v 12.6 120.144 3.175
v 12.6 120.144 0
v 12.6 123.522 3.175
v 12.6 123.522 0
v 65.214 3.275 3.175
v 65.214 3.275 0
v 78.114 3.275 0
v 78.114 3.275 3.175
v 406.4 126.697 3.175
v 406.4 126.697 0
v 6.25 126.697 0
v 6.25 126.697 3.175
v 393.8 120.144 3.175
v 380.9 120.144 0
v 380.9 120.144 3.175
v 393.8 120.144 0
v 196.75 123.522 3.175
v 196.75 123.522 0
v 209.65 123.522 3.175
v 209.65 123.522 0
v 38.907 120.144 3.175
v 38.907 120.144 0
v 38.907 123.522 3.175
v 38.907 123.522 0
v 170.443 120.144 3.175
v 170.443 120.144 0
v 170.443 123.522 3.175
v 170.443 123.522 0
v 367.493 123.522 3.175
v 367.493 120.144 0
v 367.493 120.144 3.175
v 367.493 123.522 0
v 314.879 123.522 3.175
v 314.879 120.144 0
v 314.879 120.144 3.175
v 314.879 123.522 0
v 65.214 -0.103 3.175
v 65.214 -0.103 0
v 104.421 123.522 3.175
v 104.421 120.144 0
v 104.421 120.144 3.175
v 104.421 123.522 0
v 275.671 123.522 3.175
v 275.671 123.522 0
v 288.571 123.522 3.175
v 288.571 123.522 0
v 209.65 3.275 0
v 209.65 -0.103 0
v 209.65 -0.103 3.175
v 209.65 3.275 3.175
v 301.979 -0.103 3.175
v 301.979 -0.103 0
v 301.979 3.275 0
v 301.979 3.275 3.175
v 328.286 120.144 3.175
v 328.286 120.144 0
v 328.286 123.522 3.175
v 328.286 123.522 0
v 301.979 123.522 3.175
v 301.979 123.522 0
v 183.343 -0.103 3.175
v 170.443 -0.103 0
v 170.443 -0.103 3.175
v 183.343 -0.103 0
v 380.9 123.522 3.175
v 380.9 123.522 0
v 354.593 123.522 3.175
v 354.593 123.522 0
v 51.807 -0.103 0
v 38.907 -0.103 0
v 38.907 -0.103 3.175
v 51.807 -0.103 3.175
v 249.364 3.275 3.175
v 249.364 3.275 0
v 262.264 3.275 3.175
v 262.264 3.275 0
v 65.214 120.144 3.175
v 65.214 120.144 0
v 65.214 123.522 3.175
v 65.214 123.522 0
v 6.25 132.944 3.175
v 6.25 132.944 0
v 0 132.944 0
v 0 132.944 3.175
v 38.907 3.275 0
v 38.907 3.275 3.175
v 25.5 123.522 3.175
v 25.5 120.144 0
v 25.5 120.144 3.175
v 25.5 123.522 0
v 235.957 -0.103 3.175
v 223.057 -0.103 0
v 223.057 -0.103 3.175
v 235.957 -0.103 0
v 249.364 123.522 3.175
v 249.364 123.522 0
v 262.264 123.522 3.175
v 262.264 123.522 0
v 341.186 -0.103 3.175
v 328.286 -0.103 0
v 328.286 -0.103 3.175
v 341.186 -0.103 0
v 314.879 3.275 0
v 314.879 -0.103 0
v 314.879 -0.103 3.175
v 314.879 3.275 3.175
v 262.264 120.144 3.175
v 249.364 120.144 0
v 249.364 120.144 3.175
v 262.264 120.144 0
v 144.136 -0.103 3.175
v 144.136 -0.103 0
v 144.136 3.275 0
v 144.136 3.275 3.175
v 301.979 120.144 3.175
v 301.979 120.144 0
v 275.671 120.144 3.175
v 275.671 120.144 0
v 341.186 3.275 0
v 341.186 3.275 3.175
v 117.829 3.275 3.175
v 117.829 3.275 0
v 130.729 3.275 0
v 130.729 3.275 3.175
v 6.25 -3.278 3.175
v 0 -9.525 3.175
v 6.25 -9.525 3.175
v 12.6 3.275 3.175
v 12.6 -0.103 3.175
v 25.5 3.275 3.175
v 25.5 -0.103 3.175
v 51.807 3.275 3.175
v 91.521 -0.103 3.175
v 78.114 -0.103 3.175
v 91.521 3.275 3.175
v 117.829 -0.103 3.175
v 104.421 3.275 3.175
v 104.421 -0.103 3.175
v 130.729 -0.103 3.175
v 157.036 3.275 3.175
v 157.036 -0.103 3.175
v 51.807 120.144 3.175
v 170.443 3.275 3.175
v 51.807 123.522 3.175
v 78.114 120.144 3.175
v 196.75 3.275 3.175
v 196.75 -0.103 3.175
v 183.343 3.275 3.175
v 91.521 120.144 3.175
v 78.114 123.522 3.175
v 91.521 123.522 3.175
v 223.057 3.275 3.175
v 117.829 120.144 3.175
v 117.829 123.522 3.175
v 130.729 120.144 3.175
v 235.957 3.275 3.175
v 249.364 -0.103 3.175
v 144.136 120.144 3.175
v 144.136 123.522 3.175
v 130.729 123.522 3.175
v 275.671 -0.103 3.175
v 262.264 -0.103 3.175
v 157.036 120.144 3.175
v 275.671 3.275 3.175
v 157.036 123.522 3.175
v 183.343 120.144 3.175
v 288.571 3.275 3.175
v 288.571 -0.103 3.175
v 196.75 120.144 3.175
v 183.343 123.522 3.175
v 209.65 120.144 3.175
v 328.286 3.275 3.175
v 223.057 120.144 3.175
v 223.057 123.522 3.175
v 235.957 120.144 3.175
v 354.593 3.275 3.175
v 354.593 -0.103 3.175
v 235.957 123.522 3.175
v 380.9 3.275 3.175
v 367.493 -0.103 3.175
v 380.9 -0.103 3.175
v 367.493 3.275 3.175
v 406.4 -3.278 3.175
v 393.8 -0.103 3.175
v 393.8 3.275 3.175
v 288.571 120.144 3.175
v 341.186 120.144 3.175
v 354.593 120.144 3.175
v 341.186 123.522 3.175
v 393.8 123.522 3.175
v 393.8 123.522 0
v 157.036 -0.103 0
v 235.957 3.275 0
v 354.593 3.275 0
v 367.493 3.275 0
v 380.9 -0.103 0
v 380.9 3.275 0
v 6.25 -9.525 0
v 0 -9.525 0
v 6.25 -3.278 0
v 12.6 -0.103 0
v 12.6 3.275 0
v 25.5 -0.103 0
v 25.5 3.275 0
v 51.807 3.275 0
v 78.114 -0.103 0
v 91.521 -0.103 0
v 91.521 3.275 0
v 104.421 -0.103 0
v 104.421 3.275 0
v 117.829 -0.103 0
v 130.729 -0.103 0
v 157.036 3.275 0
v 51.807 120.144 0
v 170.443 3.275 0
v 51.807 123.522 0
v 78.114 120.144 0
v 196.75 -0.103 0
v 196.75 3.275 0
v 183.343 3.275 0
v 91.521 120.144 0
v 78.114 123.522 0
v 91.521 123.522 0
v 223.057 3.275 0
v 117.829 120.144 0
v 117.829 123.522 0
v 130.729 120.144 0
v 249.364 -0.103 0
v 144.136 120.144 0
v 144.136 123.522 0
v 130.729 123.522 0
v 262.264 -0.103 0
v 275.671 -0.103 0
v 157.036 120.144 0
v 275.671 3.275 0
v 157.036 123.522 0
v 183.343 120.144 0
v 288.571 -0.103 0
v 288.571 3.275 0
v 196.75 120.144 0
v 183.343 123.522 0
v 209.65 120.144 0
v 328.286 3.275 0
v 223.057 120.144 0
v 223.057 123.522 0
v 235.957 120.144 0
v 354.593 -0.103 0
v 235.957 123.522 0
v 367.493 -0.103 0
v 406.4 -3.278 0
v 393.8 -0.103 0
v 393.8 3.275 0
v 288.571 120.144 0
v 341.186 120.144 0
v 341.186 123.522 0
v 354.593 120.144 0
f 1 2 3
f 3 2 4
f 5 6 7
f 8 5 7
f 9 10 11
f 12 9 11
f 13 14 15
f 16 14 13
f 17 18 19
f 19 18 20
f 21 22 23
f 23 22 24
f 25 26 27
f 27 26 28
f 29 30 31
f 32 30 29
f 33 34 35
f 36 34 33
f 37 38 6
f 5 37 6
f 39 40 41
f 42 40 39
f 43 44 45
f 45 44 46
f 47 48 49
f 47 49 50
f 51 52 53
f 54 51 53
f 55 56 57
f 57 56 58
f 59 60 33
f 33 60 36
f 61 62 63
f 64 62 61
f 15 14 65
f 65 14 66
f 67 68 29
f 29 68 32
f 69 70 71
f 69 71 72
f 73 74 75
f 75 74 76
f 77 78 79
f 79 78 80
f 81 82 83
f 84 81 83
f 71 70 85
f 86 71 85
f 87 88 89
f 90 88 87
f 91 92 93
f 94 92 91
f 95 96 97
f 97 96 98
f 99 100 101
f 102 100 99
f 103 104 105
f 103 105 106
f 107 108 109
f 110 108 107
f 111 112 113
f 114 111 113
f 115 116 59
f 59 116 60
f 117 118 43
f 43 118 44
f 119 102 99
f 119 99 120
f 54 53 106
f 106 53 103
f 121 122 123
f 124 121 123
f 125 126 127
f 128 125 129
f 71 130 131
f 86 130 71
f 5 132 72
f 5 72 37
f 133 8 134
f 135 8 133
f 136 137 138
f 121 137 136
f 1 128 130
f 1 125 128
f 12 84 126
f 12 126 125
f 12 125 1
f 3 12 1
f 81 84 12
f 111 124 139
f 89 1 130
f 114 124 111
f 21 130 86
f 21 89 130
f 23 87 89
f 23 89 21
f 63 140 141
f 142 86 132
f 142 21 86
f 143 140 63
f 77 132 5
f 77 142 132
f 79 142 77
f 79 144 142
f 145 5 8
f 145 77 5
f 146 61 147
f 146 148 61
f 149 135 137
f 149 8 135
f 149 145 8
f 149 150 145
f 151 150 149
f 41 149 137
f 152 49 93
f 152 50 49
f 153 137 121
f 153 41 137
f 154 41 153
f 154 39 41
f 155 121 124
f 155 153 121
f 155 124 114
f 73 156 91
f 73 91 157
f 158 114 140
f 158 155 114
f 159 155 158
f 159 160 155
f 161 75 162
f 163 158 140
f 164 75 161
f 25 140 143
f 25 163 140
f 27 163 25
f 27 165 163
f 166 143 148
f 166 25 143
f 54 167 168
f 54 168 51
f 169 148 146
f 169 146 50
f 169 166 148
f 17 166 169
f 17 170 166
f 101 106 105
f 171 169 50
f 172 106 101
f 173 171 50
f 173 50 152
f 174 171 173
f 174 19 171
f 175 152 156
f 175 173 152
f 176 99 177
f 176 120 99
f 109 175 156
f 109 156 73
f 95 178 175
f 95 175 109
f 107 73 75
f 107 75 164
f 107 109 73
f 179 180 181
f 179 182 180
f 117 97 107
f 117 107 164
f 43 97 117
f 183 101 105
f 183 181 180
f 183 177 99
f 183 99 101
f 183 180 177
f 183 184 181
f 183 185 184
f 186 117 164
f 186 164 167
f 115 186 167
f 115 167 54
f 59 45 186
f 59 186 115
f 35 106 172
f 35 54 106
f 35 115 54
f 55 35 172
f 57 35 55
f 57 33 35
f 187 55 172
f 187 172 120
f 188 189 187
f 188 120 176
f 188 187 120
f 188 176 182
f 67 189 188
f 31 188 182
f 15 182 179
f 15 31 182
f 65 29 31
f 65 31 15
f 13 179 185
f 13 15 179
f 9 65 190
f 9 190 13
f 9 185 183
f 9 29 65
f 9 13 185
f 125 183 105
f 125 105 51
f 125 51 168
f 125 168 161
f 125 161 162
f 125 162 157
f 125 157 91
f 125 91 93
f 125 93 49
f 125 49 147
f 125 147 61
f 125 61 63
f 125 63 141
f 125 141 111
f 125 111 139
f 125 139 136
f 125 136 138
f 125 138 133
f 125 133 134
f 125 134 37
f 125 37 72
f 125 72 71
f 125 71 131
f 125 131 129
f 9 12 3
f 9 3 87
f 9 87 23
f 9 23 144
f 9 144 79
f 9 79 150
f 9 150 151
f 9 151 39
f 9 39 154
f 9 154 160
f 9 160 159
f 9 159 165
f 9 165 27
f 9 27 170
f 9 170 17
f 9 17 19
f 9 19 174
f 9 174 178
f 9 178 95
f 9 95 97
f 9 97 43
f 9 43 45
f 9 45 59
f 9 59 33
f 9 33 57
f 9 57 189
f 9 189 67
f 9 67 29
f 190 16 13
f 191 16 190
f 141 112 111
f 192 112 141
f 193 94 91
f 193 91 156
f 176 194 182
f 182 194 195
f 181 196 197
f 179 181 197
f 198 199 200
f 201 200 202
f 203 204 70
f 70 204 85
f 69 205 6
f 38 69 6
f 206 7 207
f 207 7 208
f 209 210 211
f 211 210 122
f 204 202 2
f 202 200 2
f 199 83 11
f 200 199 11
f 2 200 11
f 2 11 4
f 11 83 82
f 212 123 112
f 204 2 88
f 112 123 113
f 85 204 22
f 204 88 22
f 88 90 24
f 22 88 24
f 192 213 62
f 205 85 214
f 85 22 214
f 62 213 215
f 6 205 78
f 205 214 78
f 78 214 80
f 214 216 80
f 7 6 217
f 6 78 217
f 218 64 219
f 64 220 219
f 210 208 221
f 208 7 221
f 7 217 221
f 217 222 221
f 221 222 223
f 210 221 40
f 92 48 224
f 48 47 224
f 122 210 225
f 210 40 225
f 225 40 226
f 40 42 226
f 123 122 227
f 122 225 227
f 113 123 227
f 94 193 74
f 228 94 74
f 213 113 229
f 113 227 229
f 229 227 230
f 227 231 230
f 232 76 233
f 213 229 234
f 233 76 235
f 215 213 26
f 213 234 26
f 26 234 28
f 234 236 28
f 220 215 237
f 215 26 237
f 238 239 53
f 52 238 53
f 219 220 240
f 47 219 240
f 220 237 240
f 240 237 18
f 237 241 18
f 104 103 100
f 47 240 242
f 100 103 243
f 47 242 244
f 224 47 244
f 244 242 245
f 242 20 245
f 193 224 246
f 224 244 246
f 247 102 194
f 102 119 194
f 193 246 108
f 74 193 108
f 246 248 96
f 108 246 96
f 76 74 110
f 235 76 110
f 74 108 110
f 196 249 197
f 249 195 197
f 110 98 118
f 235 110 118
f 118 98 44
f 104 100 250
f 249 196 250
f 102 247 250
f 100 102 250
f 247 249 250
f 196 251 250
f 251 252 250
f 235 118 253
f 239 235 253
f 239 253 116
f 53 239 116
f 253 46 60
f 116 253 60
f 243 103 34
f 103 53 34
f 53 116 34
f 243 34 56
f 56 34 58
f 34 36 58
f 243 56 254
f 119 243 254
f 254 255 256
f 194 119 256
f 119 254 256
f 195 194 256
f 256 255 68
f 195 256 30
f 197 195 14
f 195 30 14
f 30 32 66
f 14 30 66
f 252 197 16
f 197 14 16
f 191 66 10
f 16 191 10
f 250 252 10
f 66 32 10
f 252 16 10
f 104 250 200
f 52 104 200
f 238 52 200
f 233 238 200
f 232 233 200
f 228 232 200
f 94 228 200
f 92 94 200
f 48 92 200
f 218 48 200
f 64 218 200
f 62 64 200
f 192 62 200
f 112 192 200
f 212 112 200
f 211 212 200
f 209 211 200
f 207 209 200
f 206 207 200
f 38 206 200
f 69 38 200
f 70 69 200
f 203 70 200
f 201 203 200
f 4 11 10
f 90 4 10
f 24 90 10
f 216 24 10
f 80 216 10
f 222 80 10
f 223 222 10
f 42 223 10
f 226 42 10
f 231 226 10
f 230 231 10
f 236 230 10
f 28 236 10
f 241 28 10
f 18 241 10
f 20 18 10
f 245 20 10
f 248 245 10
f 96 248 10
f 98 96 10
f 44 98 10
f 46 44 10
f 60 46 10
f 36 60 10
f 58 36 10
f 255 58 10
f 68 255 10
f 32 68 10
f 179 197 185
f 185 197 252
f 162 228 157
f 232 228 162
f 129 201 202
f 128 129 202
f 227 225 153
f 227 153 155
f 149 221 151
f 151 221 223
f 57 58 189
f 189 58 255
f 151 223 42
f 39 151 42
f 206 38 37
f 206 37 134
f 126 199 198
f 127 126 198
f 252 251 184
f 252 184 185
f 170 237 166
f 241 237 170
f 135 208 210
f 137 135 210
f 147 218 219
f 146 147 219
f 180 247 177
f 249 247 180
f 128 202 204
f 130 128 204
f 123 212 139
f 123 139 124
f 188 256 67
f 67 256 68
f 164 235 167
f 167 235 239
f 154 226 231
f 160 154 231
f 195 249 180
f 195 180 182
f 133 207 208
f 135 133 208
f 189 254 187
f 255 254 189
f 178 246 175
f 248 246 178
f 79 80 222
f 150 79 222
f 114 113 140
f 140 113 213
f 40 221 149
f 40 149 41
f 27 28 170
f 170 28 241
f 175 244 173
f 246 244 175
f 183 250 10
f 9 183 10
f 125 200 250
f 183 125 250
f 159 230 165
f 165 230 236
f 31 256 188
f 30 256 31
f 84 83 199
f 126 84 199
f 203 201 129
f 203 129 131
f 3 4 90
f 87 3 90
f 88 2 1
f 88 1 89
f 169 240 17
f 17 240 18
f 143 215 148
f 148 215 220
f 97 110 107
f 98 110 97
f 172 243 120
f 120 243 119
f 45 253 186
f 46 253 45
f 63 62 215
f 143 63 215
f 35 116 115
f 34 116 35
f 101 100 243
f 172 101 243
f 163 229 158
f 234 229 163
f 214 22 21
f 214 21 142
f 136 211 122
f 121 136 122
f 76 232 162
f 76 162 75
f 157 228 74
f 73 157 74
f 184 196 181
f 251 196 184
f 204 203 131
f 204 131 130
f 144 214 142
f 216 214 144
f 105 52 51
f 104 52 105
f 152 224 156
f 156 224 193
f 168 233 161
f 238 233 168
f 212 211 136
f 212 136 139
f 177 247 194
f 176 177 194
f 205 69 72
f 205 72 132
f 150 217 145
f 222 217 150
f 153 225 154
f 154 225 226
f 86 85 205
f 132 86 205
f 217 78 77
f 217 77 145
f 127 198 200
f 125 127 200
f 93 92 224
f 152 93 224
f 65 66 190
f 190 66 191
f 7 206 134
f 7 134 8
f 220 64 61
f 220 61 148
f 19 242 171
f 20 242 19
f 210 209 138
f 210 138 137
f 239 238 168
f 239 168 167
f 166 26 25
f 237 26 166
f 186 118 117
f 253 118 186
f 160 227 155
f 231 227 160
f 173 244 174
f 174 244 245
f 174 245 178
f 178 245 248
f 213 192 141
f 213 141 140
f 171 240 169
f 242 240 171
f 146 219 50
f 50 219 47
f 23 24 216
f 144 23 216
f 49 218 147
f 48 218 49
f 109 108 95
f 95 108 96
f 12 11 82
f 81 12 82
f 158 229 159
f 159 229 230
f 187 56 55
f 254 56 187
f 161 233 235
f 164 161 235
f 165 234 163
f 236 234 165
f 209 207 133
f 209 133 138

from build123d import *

# Parameters (mm, degrees)
SKETCH1_W           = 12.9
SKETCH1_H           = 3.3782
BOSS_EXTRUDE2_DEPTH = 3.175


with BuildPart() as part:
    # Sketch1 → Boss-Extrude2 (new body)
    with BuildSketch(Plane.XY):
        Polygon((6.2500002, -9.525), (6.2500002, -3.2782), (406.4, -3.2782), (406.4, 126.6968), (6.2500002, 126.6968), (6.2500002, 132.9436), (0, 132.9436), (0, -9.525), align=None)
        with Locations((19.05, 121.8327)):
            Rectangle(SKETCH1_W, SKETCH1_H, mode=Mode.SUBTRACT)
        with Locations((45.357142857, 121.8327)):
            Rectangle(SKETCH1_W, SKETCH1_H, mode=Mode.SUBTRACT)
        with Locations((387.35, 121.8327)):
            Rectangle(SKETCH1_W, SKETCH1_H, mode=Mode.SUBTRACT)
        with Locations((361.042857143, 121.8327)):
            Rectangle(SKETCH1_W, SKETCH1_H, mode=Mode.SUBTRACT)
        with Locations((71.664285714, 121.8327)):
            Rectangle(SKETCH1_W, SKETCH1_H, mode=Mode.SUBTRACT)
        with Locations((97.971428571, 121.8327)):
            Rectangle(SKETCH1_W, SKETCH1_H, mode=Mode.SUBTRACT)
        with Locations((124.278571429, 121.8327)):
            Rectangle(SKETCH1_W, SKETCH1_H, mode=Mode.SUBTRACT)
        with Locations((150.585714286, 121.8327)):
            Rectangle(SKETCH1_W, SKETCH1_H, mode=Mode.SUBTRACT)
        with Locations((176.892857143, 121.8327)):
            Rectangle(SKETCH1_W, SKETCH1_H, mode=Mode.SUBTRACT)
        with Locations((203.2, 121.8327)):
            Rectangle(SKETCH1_W, SKETCH1_H, mode=Mode.SUBTRACT)
        with Locations((229.507142857, 121.8327)):
            Rectangle(SKETCH1_W, SKETCH1_H, mode=Mode.SUBTRACT)
        with Locations((255.814285714, 121.8327)):
            Rectangle(SKETCH1_W, SKETCH1_H, mode=Mode.SUBTRACT)
        with Locations((282.121428571, 121.8327)):
            Rectangle(SKETCH1_W, SKETCH1_H, mode=Mode.SUBTRACT)
        with Locations((308.428571429, 121.8327)):
            Rectangle(SKETCH1_W, SKETCH1_H, mode=Mode.SUBTRACT)
        with Locations((334.735714286, 121.8327)):
            Rectangle(SKETCH1_W, SKETCH1_H, mode=Mode.SUBTRACT)
        with Locations((387.35, 1.5859)):
            Rectangle(SKETCH1_W, SKETCH1_H, mode=Mode.SUBTRACT)
        with Locations((361.042857143, 1.5859)):
            Rectangle(SKETCH1_W, SKETCH1_H, mode=Mode.SUBTRACT)
        with Locations((334.735714286, 1.5859)):
            Rectangle(SKETCH1_W, SKETCH1_H, mode=Mode.SUBTRACT)
        with Locations((308.428571429, 1.5859)):
            Rectangle(SKETCH1_W, SKETCH1_H, mode=Mode.SUBTRACT)
        with Locations((282.121428571, 1.5859)):
            Rectangle(SKETCH1_W, SKETCH1_H, mode=Mode.SUBTRACT)
        with Locations((255.814285714, 1.5859)):
            Rectangle(SKETCH1_W, SKETCH1_H, mode=Mode.SUBTRACT)
        with Locations((229.507142857, 1.5859)):
            Rectangle(SKETCH1_W, SKETCH1_H, mode=Mode.SUBTRACT)
        with Locations((203.2, 1.5859)):
            Rectangle(SKETCH1_W, SKETCH1_H, mode=Mode.SUBTRACT)
        with Locations((176.892857143, 1.5859)):
            Rectangle(SKETCH1_W, SKETCH1_H, mode=Mode.SUBTRACT)
        with Locations((150.585714286, 1.5859)):
            Rectangle(SKETCH1_W, SKETCH1_H, mode=Mode.SUBTRACT)
        with Locations((124.278571429, 1.5859)):
            Rectangle(SKETCH1_W, SKETCH1_H, mode=Mode.SUBTRACT)
        with Locations((97.971428571, 1.5859)):
            Rectangle(SKETCH1_W, SKETCH1_H, mode=Mode.SUBTRACT)
        with Locations((71.664285714, 1.5859)):
            Rectangle(SKETCH1_W, SKETCH1_H, mode=Mode.SUBTRACT)
        with Locations((45.357142857, 1.5859)):
            Rectangle(SKETCH1_W, SKETCH1_H, mode=Mode.SUBTRACT)
        with Locations((19.05, 1.5859)):
            Rectangle(SKETCH1_W, SKETCH1_H, mode=Mode.SUBTRACT)
    extrude(amount=BOSS_EXTRUDE2_DEPTH)


solid = part.part
